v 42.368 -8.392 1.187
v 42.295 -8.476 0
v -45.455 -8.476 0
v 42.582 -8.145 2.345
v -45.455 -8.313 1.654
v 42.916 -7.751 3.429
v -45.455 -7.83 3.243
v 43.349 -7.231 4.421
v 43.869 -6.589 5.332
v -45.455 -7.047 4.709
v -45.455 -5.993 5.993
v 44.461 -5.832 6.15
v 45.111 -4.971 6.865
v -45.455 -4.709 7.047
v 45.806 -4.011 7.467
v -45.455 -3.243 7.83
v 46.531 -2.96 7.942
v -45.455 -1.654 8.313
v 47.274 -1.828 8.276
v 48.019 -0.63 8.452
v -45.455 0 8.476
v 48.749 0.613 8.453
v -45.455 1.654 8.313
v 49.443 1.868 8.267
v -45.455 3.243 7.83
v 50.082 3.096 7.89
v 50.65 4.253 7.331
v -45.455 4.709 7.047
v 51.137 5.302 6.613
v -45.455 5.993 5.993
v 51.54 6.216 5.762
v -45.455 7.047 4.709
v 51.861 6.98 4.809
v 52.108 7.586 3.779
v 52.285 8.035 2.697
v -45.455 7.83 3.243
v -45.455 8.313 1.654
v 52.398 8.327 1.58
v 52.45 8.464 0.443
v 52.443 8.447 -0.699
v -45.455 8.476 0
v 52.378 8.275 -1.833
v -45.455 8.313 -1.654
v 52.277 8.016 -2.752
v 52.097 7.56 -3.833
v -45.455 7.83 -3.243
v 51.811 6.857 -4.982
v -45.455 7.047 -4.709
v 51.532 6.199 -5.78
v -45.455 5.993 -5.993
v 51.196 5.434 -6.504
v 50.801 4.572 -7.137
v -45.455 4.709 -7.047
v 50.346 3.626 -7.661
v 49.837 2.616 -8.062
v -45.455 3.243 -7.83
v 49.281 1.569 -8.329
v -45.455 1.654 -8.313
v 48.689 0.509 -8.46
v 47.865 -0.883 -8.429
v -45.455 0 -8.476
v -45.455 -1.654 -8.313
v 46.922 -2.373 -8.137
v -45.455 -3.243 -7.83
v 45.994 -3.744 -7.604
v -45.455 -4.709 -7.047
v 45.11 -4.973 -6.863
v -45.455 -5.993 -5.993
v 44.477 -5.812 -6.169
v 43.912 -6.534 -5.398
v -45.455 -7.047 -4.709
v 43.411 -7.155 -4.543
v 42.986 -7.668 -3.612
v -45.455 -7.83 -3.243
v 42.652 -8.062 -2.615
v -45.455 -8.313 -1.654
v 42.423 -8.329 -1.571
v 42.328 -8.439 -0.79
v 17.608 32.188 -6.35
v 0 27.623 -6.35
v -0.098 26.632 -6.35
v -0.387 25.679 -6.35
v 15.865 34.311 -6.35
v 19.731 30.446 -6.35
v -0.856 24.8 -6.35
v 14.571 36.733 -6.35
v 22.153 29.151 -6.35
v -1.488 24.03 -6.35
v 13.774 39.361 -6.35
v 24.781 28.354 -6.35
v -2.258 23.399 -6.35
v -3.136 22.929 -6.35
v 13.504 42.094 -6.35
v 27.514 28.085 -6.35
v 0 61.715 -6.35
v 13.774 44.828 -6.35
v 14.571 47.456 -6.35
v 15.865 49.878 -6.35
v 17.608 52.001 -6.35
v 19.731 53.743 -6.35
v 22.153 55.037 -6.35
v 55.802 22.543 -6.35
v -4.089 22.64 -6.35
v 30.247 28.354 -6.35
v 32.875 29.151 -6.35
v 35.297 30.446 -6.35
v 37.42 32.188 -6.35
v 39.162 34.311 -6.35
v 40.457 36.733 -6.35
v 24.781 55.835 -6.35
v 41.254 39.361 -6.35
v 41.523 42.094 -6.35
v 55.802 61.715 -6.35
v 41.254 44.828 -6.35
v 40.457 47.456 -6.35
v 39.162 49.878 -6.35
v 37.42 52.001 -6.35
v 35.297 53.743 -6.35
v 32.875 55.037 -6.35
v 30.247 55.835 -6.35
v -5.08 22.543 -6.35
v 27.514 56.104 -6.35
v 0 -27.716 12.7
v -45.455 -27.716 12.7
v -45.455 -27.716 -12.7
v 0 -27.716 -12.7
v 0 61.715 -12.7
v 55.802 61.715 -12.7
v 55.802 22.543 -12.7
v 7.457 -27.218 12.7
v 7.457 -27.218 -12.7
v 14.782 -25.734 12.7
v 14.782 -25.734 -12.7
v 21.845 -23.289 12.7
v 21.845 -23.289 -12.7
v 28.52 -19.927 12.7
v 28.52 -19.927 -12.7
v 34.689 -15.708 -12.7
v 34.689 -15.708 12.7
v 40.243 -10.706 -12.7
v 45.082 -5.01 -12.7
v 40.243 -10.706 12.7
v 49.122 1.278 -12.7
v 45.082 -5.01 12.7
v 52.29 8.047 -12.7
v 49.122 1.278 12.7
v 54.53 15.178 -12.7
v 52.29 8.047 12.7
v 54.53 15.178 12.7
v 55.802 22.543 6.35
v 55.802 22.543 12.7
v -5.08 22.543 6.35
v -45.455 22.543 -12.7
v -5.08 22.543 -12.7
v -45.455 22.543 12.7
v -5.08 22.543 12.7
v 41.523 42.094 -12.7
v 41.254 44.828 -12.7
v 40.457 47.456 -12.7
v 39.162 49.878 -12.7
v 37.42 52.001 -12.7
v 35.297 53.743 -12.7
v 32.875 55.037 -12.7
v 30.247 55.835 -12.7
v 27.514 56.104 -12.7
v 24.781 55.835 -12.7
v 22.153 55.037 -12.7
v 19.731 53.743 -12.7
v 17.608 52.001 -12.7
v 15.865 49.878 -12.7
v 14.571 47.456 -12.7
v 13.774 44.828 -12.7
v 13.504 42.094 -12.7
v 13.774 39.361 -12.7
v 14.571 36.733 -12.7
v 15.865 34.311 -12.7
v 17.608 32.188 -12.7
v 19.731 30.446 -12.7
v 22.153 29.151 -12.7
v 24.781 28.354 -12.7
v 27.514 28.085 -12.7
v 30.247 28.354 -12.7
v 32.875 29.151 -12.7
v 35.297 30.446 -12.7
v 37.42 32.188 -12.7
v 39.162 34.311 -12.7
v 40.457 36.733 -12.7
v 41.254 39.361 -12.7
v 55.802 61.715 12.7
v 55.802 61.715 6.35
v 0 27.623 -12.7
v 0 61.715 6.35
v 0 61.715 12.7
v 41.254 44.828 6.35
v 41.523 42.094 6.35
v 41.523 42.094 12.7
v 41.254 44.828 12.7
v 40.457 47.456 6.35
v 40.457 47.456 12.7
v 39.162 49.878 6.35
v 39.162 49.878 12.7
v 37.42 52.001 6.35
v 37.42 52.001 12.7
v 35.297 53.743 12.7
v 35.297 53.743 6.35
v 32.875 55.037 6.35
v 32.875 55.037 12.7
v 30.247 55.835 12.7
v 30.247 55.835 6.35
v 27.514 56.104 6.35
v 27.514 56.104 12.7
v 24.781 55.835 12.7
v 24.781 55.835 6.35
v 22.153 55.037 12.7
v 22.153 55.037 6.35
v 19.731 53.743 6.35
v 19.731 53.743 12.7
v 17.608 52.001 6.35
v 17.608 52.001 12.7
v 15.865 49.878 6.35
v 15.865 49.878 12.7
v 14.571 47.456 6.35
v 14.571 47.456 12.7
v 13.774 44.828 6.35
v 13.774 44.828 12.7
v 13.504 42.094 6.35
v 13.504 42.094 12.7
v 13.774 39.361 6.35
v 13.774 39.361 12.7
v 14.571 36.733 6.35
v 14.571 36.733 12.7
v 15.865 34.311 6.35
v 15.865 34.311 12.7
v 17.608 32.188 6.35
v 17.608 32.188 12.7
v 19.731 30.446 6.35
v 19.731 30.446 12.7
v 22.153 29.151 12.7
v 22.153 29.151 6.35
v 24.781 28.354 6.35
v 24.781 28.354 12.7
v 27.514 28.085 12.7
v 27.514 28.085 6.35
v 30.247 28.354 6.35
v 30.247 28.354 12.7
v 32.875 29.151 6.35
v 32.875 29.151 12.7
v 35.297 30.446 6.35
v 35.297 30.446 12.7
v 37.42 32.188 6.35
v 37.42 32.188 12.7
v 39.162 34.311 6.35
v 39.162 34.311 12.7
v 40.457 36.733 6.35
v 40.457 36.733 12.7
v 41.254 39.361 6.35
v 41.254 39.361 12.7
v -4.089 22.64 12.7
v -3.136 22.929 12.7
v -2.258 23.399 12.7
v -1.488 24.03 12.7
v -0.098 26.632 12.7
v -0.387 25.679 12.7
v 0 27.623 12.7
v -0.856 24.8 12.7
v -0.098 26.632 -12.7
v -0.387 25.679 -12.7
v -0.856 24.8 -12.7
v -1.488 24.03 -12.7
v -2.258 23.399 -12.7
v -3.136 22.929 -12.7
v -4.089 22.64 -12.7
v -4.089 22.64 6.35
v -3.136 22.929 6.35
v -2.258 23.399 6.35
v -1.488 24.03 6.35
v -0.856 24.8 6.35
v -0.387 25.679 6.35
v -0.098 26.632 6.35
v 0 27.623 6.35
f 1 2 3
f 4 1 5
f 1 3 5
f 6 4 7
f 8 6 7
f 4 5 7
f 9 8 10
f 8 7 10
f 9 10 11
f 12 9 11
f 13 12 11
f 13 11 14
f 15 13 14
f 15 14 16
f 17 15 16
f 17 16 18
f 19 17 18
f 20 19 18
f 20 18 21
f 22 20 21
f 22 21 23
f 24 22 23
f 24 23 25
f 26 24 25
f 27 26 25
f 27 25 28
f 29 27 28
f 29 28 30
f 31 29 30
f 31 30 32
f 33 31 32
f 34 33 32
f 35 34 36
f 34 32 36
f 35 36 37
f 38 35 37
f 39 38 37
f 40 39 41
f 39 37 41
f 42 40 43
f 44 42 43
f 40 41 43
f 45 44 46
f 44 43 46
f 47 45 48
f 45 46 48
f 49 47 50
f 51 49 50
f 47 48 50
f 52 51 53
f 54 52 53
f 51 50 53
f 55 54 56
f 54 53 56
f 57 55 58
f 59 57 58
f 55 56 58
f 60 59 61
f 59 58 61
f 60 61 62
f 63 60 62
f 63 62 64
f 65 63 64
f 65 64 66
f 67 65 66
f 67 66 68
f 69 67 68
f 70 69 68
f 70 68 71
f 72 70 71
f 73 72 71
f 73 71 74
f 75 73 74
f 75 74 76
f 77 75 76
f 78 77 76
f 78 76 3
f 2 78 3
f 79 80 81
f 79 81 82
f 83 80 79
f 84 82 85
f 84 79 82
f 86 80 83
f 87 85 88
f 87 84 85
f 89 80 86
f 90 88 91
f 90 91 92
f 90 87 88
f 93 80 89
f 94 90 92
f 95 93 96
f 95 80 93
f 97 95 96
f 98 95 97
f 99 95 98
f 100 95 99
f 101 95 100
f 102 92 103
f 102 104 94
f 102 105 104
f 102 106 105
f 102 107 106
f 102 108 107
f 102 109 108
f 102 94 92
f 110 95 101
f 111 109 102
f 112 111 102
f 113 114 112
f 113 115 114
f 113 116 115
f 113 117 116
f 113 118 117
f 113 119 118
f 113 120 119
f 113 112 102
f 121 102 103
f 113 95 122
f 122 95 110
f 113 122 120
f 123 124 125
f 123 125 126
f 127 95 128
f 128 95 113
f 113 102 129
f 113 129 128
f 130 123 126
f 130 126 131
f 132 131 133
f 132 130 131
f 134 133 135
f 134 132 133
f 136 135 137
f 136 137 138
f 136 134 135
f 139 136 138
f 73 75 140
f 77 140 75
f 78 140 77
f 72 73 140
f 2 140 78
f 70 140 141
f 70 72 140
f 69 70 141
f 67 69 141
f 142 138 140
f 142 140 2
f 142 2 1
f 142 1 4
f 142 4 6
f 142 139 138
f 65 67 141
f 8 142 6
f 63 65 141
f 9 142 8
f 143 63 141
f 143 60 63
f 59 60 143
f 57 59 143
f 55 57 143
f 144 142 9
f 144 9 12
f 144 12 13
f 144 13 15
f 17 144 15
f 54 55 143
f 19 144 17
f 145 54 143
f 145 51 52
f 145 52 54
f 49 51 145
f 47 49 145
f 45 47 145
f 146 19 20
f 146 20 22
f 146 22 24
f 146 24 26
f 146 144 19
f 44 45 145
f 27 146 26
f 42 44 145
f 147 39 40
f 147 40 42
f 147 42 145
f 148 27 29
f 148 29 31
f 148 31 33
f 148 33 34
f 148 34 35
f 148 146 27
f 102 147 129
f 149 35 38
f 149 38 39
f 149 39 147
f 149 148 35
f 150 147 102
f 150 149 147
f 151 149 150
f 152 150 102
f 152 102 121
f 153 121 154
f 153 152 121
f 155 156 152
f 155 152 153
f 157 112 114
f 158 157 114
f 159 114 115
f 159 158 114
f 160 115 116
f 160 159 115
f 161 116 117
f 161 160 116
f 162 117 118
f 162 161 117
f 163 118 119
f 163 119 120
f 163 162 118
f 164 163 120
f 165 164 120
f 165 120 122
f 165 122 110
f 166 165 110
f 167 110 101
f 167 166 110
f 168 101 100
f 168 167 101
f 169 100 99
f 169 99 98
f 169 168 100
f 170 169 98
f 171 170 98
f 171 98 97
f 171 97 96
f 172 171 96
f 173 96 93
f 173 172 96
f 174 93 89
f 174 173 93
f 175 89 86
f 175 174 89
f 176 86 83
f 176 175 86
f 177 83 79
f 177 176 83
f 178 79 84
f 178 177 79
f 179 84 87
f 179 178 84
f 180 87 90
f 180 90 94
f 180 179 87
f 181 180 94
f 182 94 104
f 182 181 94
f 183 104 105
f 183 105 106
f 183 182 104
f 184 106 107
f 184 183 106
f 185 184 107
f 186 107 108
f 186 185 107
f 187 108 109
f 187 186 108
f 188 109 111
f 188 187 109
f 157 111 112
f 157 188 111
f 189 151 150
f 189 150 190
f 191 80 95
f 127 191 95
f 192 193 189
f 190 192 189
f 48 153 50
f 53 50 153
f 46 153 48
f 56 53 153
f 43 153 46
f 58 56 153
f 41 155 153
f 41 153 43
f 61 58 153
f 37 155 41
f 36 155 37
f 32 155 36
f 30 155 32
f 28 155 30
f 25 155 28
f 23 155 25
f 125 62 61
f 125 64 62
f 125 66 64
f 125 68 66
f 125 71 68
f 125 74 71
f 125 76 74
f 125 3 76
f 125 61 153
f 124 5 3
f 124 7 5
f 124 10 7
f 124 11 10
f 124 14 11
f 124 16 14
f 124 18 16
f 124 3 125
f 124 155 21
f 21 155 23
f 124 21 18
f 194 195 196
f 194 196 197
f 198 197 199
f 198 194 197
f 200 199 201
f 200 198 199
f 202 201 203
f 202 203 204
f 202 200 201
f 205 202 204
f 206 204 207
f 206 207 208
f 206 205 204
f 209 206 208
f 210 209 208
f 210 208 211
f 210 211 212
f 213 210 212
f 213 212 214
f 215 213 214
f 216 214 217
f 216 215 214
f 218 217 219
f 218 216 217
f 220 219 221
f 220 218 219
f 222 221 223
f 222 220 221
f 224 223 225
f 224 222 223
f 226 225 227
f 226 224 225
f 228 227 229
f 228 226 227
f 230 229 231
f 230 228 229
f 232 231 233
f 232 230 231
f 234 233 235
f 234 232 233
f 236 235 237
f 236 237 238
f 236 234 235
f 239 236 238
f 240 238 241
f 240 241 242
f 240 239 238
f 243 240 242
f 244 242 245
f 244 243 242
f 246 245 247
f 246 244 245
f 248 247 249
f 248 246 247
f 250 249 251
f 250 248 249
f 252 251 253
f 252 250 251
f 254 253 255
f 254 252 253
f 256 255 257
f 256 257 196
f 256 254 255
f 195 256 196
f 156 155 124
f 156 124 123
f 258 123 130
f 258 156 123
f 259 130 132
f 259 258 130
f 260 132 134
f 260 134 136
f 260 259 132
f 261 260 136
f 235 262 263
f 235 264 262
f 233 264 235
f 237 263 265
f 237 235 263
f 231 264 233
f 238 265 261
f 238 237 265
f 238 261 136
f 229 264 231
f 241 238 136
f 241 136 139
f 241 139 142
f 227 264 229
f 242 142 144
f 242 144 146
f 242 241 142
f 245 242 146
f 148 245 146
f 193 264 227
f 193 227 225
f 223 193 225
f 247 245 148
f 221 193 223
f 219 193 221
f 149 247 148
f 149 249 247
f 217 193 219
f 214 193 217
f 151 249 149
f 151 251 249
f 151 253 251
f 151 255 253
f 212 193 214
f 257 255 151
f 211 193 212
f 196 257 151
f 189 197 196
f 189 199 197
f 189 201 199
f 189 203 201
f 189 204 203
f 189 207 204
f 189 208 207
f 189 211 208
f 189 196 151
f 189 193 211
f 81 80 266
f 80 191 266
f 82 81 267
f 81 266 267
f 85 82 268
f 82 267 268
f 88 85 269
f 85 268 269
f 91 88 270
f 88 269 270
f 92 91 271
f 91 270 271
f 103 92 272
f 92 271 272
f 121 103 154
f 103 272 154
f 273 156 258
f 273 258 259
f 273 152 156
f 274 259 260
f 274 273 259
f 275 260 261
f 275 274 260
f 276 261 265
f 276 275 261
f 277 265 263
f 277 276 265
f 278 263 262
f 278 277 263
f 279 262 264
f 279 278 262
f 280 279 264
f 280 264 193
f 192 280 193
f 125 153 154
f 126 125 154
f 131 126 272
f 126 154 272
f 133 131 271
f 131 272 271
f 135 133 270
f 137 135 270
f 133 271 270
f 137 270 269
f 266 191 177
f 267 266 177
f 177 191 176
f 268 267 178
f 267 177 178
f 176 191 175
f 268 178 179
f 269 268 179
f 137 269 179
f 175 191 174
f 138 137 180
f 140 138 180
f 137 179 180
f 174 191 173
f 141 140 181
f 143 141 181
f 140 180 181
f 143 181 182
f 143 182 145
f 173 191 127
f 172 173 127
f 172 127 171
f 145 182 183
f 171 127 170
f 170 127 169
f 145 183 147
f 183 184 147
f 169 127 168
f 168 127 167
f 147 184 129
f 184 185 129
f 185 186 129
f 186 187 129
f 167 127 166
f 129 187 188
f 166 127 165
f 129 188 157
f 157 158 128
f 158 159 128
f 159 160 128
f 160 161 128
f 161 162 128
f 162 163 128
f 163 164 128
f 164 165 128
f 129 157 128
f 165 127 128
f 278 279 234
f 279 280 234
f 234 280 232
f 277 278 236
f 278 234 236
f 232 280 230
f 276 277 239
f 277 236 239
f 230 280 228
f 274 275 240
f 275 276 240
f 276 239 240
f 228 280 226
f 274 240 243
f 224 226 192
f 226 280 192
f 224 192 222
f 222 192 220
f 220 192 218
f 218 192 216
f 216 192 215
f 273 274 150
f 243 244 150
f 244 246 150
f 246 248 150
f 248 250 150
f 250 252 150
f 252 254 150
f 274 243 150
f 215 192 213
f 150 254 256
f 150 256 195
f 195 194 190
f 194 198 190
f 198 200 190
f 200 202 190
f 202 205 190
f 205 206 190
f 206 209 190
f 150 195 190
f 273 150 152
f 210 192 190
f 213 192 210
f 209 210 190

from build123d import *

# Parameters (mm, degrees)
F0_W     = 55.8020919561
F0_H     = 39.1723364592
F0_R     = 14.0094122965
F1_DEPTH = 12.7
F2_DEPTH = 6.35
F3_R     = 5.08
F4_R     = 5.08
F5_R     = 8.4755986108
F6_DEPTH = 125.9534060955


with BuildPart() as f1:
    # F0 (on Top) → F1 (new body, symmetric)
    with BuildSketch(Plane.XY):
        with BuildLine():
            Line((0, 22.542566061), (-45.4546958208, 22.542566061))
            Line((-45.4546958208, 22.542566061), (-45.4546958208, -27.7162790298))
            Line((-45.4546958208, -27.7162790298), (0, -27.7162790298))
            ThreePointArc((0, -27.7162790298), (37.5493840713, -13.2993479579), (55.8020919561, 22.542566061))
            Line((55.8020919561, 22.542566061), (0, 22.542566061))
        make_face()
        with Locations((27.9010459781, 42.1287342906)):
            Rectangle(F0_W, F0_H)
        with Locations((27.5138542056, 42.0944318175)):
            Circle(F0_R, mode=Mode.SUBTRACT)
    extrude(amount=F1_DEPTH, both=True)

    # F0 (on Top) → F2 (cut, symmetric)
    with BuildSketch(Plane.XY):
        with Locations((27.9010459781, 42.1287342906)):
            Rectangle(F0_W, F0_H)
        with Locations((27.5138542056, 42.0944318175)):
            Circle(F0_R, mode=Mode.SUBTRACT)
    extrude(amount=F2_DEPTH, both=True, mode=Mode.SUBTRACT)

    # F3
    f3_edges = [f1.edges().sort_by_distance(p)[0] for p in [
        (0, 22.542566, 9.525),
    ]]
    fillet(f3_edges, radius=F3_R)

    # F4
    f4_edges = [f1.edges().sort_by_distance(p)[0] for p in [
        (0, 22.542566, -9.525),
    ]]
    fillet(f4_edges, radius=F4_R)

    # F5 (on face) → F6 (cut)
    with BuildSketch(Plane(origin=(-45.4546958208, 0, 0), x_dir=(0, -1, 0), z_dir=(-1, 0, 0))):
        Circle(F5_R)
    extrude(amount=-F6_DEPTH, mode=Mode.SUBTRACT)


solid = f1.part
